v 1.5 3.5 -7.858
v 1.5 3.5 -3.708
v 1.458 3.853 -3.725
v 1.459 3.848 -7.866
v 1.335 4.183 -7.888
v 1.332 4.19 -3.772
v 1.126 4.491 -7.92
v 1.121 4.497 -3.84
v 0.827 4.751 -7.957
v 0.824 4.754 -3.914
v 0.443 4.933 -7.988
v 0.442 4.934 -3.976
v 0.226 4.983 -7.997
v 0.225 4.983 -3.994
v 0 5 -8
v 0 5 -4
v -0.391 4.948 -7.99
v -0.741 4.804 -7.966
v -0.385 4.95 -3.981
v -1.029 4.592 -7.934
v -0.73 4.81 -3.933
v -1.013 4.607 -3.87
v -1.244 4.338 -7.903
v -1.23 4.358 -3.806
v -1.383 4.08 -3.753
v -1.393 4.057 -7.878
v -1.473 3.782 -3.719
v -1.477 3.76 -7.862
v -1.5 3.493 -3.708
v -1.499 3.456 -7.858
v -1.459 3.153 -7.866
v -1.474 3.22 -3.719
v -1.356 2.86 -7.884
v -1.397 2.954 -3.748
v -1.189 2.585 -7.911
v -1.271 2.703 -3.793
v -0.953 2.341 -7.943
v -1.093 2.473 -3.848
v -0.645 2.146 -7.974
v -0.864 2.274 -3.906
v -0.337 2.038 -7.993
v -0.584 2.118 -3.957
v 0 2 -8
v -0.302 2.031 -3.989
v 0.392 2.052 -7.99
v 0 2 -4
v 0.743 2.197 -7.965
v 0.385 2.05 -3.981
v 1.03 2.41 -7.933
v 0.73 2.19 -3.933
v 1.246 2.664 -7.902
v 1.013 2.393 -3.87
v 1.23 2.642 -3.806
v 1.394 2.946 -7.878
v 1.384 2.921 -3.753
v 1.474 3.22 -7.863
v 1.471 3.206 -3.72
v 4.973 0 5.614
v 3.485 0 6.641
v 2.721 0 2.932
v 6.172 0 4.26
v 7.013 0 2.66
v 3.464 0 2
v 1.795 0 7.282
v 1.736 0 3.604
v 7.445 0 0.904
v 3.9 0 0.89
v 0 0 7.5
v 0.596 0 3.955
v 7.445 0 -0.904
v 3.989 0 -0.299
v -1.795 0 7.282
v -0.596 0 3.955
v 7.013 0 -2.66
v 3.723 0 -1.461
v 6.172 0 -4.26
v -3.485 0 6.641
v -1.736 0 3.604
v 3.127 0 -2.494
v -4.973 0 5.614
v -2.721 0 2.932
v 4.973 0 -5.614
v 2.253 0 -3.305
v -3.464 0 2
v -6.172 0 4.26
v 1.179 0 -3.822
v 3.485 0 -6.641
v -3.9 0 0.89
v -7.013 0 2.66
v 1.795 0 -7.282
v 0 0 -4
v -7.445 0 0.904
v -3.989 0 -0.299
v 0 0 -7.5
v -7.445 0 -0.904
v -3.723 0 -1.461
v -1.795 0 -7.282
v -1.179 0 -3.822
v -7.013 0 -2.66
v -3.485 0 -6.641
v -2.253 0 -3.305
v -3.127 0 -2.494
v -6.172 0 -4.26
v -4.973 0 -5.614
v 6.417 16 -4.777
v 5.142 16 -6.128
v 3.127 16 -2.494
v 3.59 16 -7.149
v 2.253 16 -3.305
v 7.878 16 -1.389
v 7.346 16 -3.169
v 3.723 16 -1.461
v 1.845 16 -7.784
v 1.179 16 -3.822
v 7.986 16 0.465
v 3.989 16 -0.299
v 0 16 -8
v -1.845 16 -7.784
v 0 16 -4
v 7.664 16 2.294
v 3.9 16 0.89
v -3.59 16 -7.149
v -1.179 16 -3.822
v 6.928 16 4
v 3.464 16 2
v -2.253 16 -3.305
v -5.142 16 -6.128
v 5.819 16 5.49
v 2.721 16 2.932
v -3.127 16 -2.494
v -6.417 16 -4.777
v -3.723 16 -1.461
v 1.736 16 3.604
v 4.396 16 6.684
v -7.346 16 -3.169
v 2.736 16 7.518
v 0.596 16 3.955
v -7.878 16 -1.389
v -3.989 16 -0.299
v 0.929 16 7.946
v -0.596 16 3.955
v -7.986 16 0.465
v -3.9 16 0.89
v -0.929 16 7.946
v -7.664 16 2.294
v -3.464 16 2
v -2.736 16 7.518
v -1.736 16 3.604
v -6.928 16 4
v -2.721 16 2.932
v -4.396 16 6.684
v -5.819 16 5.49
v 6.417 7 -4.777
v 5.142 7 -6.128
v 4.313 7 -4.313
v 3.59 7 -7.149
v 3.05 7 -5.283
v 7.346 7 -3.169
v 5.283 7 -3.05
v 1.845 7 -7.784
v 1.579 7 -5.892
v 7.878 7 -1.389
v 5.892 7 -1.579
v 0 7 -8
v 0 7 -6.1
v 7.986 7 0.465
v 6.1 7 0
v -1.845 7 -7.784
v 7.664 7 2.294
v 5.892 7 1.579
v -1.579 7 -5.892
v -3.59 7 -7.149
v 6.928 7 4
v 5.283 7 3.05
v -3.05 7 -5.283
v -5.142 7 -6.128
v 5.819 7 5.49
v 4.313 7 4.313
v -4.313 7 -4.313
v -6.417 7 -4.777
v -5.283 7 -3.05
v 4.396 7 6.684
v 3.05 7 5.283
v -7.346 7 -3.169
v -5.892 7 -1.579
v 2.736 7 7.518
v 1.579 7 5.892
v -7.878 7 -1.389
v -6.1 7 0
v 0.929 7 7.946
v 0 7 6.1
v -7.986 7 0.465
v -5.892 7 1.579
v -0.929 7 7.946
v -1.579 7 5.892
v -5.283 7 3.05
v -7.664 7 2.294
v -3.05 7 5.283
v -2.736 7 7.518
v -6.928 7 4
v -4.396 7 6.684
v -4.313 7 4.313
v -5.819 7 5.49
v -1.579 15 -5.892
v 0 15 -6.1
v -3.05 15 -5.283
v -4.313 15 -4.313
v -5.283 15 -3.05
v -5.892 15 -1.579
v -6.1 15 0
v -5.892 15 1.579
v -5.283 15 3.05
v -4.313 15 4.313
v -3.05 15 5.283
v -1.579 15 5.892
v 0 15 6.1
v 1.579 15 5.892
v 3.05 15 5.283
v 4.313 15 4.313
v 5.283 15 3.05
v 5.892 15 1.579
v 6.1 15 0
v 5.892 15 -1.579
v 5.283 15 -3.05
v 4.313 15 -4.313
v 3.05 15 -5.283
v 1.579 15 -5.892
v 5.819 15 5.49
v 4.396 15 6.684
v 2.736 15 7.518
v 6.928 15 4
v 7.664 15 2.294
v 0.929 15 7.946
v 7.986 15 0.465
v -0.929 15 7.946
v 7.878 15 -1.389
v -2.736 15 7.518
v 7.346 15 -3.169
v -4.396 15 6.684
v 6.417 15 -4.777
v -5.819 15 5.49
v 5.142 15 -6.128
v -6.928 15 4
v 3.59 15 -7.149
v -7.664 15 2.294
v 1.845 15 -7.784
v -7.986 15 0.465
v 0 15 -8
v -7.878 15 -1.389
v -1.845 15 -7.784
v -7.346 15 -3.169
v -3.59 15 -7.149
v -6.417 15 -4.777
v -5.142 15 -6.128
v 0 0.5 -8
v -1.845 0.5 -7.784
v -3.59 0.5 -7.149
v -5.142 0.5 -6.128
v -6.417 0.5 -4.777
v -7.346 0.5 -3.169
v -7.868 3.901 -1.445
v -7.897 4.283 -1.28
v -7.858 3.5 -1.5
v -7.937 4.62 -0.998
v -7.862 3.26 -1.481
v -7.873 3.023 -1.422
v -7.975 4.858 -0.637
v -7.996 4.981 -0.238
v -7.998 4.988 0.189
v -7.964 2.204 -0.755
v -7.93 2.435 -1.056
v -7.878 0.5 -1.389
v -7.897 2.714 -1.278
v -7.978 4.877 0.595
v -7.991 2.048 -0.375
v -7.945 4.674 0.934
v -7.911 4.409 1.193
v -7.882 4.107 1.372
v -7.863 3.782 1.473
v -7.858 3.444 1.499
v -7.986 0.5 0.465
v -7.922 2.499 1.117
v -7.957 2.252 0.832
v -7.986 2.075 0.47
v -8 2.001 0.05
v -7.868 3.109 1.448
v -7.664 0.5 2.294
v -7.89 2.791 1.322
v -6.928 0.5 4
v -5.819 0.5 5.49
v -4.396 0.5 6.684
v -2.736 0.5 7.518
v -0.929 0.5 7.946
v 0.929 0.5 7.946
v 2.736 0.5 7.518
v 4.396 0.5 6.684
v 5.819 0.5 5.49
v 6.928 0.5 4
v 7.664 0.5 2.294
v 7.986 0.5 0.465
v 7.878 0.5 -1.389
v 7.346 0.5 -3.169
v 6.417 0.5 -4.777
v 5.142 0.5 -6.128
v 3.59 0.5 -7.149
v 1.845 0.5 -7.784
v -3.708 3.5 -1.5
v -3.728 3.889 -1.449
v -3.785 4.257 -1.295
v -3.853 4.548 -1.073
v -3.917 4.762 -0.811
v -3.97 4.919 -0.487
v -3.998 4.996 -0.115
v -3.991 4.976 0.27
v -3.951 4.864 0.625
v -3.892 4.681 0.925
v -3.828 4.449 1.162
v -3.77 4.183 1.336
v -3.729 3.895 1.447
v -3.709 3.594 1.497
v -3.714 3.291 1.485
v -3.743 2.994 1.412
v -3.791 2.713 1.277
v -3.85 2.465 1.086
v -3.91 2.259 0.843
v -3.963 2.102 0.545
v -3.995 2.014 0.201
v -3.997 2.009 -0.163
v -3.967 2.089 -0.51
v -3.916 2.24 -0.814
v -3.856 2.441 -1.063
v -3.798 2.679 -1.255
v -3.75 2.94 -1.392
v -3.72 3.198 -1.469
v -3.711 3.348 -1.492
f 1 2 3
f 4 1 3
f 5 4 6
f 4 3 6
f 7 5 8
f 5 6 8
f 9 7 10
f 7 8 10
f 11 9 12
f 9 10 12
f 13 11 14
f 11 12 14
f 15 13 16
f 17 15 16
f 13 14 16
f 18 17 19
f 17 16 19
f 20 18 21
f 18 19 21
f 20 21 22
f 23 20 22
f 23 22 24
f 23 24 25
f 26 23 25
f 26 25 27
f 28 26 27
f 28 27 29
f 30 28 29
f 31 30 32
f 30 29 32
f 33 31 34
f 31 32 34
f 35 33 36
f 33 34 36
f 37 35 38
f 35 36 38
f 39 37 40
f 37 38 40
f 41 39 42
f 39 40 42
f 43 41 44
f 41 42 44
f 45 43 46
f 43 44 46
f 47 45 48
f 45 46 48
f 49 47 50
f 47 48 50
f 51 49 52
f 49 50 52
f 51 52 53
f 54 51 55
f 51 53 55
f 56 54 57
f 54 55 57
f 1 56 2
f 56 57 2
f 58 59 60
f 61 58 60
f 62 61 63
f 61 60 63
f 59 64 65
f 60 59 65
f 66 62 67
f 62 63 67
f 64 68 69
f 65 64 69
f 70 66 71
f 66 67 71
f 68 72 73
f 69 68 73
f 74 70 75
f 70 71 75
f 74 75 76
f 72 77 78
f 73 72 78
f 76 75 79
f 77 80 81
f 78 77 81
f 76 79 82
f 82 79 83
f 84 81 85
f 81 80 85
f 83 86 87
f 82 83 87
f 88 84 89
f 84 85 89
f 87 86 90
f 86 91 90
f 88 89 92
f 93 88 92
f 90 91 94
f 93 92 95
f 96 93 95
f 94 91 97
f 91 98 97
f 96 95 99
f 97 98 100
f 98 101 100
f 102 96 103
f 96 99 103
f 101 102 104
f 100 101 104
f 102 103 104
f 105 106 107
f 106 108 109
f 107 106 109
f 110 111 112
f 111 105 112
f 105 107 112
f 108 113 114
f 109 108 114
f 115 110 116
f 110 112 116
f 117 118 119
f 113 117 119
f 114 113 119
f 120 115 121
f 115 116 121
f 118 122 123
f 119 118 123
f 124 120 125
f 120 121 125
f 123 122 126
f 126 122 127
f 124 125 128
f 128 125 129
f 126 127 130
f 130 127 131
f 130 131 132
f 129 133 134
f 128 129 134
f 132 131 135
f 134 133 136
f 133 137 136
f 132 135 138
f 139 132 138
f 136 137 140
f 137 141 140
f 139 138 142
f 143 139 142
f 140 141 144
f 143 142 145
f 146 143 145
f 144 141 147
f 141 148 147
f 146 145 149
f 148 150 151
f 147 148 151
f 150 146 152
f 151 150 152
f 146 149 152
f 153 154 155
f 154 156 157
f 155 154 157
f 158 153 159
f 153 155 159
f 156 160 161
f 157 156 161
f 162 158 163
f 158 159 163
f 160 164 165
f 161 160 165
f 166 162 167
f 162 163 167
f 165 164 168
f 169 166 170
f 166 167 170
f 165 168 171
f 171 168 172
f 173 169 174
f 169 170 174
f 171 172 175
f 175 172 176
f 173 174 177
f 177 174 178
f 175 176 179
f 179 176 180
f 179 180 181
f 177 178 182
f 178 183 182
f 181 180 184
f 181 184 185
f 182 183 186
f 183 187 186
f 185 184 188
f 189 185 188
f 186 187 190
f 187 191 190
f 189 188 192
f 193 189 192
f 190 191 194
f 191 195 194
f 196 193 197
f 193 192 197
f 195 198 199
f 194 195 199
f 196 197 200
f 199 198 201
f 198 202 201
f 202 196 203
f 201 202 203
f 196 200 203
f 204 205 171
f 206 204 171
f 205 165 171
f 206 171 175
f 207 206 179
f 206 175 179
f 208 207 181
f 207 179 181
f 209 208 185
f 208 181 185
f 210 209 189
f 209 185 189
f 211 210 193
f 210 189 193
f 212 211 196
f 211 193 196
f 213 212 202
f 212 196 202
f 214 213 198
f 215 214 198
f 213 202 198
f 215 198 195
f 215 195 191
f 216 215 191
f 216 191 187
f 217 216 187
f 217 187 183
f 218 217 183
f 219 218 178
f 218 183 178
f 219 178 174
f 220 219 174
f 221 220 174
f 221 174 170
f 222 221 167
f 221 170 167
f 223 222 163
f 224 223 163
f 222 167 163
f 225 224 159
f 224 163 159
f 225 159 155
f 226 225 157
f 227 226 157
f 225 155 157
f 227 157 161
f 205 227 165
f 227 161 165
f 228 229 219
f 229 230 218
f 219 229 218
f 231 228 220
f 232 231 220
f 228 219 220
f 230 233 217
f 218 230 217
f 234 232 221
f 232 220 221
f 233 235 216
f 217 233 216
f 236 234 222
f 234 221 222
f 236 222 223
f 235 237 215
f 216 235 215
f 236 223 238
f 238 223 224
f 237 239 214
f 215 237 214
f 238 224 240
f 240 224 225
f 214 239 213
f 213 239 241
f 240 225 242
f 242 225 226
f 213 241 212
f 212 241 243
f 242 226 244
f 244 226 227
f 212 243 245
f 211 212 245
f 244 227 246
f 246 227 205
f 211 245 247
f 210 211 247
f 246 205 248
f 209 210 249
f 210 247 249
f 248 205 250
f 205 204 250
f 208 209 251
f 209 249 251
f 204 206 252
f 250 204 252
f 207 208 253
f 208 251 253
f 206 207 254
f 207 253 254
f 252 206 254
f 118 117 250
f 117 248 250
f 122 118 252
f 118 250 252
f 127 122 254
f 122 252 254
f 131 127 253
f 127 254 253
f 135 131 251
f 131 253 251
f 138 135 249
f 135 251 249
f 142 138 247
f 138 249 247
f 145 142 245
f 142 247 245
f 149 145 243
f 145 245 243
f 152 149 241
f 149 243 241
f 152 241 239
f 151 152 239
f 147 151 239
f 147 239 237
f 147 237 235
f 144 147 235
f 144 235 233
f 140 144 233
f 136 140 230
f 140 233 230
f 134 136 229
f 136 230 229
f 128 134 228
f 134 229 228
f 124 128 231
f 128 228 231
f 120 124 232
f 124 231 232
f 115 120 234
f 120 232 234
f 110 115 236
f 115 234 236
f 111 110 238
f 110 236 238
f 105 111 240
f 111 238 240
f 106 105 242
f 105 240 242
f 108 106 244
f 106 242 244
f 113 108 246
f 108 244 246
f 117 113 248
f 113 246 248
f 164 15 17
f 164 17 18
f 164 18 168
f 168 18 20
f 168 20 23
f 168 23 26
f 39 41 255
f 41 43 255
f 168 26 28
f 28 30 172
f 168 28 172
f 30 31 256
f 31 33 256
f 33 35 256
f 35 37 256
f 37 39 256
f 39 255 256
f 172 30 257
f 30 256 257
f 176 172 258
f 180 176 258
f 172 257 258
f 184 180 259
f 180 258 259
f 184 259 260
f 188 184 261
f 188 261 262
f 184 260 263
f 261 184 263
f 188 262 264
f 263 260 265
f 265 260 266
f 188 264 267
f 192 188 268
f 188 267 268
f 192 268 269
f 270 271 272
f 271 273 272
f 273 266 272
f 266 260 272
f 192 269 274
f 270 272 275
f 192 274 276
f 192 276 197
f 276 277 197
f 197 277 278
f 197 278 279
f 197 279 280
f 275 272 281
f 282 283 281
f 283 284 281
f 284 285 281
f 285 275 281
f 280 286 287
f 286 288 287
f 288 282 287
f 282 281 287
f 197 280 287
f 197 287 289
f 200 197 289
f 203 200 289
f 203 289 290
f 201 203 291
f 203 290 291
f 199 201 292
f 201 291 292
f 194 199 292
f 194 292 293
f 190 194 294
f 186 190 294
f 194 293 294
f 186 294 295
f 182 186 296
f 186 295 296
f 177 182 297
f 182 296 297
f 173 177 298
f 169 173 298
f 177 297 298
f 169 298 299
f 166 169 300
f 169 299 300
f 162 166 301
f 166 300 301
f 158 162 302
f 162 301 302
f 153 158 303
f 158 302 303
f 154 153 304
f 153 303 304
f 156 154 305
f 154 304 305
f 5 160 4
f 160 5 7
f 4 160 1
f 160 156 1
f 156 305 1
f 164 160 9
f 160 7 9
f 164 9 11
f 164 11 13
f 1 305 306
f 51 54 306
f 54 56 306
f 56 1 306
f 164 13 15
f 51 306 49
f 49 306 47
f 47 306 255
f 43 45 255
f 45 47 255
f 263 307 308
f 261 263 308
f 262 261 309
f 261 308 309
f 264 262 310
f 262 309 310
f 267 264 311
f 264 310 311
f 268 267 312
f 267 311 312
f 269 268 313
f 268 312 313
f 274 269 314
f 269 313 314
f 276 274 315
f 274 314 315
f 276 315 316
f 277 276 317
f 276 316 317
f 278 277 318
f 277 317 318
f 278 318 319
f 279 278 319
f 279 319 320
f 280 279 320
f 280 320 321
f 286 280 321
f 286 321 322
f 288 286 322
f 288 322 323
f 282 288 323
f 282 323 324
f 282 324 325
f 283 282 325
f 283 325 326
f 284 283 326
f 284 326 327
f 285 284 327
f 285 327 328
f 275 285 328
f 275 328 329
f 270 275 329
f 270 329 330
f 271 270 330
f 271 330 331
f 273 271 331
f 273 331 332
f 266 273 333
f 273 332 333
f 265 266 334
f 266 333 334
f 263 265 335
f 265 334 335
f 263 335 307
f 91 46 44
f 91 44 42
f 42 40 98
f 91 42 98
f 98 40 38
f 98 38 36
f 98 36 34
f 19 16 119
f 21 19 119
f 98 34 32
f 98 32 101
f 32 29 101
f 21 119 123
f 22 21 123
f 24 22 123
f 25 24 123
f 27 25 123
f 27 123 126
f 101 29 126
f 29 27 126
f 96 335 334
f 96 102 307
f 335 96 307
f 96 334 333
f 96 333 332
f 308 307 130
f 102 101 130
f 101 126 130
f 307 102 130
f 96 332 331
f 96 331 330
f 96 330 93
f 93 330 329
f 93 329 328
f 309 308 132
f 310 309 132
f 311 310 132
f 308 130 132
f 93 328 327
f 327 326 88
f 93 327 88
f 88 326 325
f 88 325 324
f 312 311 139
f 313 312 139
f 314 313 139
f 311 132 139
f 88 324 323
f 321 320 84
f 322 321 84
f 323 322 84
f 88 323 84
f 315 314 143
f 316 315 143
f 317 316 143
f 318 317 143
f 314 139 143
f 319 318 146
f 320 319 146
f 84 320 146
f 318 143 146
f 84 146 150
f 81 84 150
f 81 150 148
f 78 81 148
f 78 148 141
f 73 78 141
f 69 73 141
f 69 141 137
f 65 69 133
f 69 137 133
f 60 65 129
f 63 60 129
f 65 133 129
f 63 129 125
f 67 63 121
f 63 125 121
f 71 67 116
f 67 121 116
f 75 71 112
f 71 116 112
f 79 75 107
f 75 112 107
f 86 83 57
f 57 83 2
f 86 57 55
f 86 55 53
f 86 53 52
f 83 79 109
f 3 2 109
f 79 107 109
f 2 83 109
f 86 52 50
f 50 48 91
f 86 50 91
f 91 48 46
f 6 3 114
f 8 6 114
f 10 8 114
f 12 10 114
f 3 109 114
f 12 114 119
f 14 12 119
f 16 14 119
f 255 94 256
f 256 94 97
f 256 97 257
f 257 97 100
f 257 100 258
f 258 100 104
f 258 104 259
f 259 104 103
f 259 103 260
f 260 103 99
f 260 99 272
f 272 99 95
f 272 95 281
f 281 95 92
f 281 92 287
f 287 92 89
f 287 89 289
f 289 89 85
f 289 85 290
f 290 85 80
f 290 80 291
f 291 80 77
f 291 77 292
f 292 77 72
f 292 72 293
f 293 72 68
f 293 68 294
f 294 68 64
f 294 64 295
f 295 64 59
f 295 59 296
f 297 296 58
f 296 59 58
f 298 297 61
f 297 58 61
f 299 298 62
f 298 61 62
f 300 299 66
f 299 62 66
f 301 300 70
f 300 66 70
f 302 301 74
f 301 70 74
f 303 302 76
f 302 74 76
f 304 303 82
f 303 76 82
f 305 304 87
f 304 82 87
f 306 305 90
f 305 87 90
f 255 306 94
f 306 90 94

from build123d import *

# Parameters (mm, degrees)
CHAMFER1_SIZE           = 0.5
CUT_EXTRUDE1_REACH      = 21.596
CUT_EXTRUDE1_END_RADIUS = 8
SKETCH2_R               = 1.5
CUT_EXTRUDE2_REACH      = 21.596
CUT_EXTRUDE2_END_RADIUS = 8
SKETCH3_R               = 1.5


with BuildPart() as part:
    # Sketch1 → Revolve1 (revolve)
    with BuildSketch(Plane.XY, mode=Mode.PRIVATE) as revolve1_sk:
        Polygon((-4, 0), (-4, 16), (-8, 16), (-8, 15), (-6.1, 15), (-6.1, 7), (-8, 7), (-8, 0), align=None)
    revolve(revolve1_sk.sketch.rotate(Axis((0, 0, 0), (0, 1, 0)), 270), axis=Axis((0, 0, 0), (0, 1, 0)))

    # Chamfer1
    chamfer1_edges = [part.edges().sort_by_distance(p)[0] for p in [
        (0, 0, 8),
    ]]
    chamfer(chamfer1_edges, length=CHAMFER1_SIZE)

    # Cut-Extrude1: up to this cylinder (the profile starts inside it)
    cut_extrude1_end = Plane(origin=(0, 3.5, 0), z_dir=(0, -1, 0)) * Cylinder(CUT_EXTRUDE1_END_RADIUS, 60.192, mode=Mode.PRIVATE)
    # Sketch2 → Cut-Extrude1 (cut, up to the surface)
    with BuildSketch(Plane.XY, mode=Mode.PRIVATE) as cut_extrude1_sk1:
        with Locations((0, 3.5)):
            Circle(SKETCH2_R)
    cut_extrude1_tool1 = extrude(cut_extrude1_sk1.sketch, amount=-CUT_EXTRUDE1_REACH, mode=Mode.PRIVATE) & cut_extrude1_end
    add(cut_extrude1_tool1.solids().sort_by_distance((0, 3.5, 0))[0], mode=Mode.SUBTRACT)

    # Cut-Extrude2: up to this cylinder (the profile starts inside it)
    cut_extrude2_end = Plane(origin=(0, 3.5, 0), z_dir=(0, -1, 0)) * Cylinder(CUT_EXTRUDE2_END_RADIUS, 60.192, mode=Mode.PRIVATE)
    # Sketch3 → Cut-Extrude2 (cut, up to the surface)
    with BuildSketch(Plane(origin=(0, 0, 0), x_dir=(0, 0, -1), z_dir=(1, 0, 0)), mode=Mode.PRIVATE) as cut_extrude2_sk1:
        with Locations((0, 3.5)):
            Circle(SKETCH3_R)
    cut_extrude2_tool1 = extrude(cut_extrude2_sk1.sketch, amount=-CUT_EXTRUDE2_REACH, mode=Mode.PRIVATE) & cut_extrude2_end
    add(cut_extrude2_tool1.solids().sort_by_distance((0, 3.5, 0))[0], mode=Mode.SUBTRACT)


solid = part.part
